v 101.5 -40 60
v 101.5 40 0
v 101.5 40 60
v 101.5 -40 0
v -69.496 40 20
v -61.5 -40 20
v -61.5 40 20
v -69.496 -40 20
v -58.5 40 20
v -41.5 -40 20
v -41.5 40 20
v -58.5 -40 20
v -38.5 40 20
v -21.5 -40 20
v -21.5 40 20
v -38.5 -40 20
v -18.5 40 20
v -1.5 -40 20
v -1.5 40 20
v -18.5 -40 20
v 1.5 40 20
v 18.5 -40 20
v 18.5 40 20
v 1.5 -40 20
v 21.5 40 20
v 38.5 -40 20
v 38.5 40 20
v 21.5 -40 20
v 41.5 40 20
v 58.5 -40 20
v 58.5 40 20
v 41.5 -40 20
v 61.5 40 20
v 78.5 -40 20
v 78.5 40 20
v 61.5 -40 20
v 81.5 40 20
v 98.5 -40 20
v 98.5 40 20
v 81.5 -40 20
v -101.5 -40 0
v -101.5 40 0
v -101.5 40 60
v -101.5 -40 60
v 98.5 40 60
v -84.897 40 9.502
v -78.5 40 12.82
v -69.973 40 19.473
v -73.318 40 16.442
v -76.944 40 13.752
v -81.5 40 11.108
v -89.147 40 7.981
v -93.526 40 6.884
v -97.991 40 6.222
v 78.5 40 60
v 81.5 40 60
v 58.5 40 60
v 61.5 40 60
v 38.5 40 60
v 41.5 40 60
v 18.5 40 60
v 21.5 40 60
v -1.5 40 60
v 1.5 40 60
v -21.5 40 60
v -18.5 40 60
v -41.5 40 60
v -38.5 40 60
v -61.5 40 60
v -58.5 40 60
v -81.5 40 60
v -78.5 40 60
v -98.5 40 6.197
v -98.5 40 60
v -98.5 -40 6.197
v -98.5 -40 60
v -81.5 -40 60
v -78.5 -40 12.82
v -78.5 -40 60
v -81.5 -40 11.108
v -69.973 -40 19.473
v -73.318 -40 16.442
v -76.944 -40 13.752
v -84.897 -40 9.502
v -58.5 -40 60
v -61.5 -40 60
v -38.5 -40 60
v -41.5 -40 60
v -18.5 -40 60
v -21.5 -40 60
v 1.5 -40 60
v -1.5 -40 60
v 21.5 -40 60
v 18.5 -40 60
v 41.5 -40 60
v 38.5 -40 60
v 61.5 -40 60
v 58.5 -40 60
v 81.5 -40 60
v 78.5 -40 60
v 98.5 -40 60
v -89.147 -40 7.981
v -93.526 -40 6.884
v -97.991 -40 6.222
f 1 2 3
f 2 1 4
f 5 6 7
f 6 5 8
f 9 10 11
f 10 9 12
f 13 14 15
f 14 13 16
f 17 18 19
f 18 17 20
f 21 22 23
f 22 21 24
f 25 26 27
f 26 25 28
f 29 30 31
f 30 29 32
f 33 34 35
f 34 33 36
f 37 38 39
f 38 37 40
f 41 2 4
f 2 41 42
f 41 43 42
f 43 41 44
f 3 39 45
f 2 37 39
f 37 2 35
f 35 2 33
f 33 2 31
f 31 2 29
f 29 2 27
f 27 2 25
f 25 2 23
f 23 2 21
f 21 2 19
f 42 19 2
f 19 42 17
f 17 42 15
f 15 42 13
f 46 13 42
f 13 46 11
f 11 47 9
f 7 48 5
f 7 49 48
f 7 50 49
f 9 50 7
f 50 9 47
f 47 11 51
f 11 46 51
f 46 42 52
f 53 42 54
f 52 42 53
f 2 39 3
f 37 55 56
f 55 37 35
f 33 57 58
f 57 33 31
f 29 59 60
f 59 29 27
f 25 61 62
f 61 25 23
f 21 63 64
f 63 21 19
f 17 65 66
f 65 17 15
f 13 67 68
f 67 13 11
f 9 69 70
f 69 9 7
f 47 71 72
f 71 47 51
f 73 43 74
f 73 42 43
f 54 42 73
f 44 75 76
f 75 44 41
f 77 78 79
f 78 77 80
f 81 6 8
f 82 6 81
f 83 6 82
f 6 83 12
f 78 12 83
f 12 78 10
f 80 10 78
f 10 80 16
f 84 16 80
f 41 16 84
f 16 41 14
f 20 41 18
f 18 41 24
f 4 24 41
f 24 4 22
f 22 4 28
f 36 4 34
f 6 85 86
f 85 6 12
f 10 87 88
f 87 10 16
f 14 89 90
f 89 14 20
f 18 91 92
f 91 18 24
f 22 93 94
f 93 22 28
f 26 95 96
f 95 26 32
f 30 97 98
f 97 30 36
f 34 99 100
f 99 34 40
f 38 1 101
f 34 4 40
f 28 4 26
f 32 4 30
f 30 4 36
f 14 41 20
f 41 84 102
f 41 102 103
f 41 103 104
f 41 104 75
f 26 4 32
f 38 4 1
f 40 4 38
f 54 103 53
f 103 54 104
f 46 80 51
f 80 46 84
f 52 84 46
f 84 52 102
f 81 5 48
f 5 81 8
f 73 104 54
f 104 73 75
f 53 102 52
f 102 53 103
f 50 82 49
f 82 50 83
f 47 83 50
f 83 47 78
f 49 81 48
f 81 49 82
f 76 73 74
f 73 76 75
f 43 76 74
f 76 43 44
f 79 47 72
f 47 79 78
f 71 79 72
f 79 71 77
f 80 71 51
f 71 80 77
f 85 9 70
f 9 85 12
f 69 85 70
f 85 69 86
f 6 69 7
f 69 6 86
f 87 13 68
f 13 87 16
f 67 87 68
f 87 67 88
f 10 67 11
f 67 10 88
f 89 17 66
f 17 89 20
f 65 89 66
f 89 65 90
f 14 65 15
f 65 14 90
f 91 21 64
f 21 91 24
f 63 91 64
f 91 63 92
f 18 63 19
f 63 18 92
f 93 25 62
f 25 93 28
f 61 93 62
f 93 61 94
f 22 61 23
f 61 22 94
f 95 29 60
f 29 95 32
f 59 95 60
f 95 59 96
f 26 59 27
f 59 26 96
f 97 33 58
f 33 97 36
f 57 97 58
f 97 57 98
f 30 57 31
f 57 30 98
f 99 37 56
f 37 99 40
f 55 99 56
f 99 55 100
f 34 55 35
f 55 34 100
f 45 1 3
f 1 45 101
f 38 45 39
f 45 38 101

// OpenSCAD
// 10-slot Petri dish rack, printed as used (rests on XY plane, builds +Z)

// ---- Base block ----
base_L = 203;   // length along X
base_W = 80;    // width along Y
base_H = 20;    // height of the solid base block

// ---- Cradle (cylindrical cutout) ----
cradle_R = 46;  // radius of the inside of the cradle cylinder
cradle_cy = 0;  // Y coordinate of the cradle axis
cradle_cz = 52; // Z coordinate of the cradle axis  (bottoms out at 52 - 46 = 6)

// ---- Divider plates ----
div_T = 3;      // plate thickness along X
div_H = 60;     // plate height (z = 0 to 60)
div_W = 80;     // plate width along Y (same as base)
div_X = [-100, -80, -60, -40, -20, 0, 20, 40, 60, 80, 100]; // 11 plates, 20 mm apart

// ---- Curved-surface resolution ----
$fn = 64;

// Base block, centred on origin in X and Y, resting on z = 0
module base() {
    translate([-base_L/2, -base_W/2, 0])
        cube([base_L, base_W, base_H]);
}

// Cradle cutter: cylinder axis along X at (y = 0, z = 52), extended 1 mm past each end
module cradle() {
    translate([-base_L/2 - 1, cradle_cy, cradle_cz])
        rotate([90, 0, 0])
            cylinder(h = base_L + 2, r = cradle_R, center = true);
}

// Eleven divider plates (cradle is NOT cut through them)
module dividers() {
    for (x = div_X)
        translate([x - div_T/2, -div_W/2, 0])
            cube([div_T, div_W, div_H]);
}

// Final solid: (base with cradle removed) unioned with the divider plates
union() {
    difference() {
        base();
        cradle();
    }
    dividers();
}
